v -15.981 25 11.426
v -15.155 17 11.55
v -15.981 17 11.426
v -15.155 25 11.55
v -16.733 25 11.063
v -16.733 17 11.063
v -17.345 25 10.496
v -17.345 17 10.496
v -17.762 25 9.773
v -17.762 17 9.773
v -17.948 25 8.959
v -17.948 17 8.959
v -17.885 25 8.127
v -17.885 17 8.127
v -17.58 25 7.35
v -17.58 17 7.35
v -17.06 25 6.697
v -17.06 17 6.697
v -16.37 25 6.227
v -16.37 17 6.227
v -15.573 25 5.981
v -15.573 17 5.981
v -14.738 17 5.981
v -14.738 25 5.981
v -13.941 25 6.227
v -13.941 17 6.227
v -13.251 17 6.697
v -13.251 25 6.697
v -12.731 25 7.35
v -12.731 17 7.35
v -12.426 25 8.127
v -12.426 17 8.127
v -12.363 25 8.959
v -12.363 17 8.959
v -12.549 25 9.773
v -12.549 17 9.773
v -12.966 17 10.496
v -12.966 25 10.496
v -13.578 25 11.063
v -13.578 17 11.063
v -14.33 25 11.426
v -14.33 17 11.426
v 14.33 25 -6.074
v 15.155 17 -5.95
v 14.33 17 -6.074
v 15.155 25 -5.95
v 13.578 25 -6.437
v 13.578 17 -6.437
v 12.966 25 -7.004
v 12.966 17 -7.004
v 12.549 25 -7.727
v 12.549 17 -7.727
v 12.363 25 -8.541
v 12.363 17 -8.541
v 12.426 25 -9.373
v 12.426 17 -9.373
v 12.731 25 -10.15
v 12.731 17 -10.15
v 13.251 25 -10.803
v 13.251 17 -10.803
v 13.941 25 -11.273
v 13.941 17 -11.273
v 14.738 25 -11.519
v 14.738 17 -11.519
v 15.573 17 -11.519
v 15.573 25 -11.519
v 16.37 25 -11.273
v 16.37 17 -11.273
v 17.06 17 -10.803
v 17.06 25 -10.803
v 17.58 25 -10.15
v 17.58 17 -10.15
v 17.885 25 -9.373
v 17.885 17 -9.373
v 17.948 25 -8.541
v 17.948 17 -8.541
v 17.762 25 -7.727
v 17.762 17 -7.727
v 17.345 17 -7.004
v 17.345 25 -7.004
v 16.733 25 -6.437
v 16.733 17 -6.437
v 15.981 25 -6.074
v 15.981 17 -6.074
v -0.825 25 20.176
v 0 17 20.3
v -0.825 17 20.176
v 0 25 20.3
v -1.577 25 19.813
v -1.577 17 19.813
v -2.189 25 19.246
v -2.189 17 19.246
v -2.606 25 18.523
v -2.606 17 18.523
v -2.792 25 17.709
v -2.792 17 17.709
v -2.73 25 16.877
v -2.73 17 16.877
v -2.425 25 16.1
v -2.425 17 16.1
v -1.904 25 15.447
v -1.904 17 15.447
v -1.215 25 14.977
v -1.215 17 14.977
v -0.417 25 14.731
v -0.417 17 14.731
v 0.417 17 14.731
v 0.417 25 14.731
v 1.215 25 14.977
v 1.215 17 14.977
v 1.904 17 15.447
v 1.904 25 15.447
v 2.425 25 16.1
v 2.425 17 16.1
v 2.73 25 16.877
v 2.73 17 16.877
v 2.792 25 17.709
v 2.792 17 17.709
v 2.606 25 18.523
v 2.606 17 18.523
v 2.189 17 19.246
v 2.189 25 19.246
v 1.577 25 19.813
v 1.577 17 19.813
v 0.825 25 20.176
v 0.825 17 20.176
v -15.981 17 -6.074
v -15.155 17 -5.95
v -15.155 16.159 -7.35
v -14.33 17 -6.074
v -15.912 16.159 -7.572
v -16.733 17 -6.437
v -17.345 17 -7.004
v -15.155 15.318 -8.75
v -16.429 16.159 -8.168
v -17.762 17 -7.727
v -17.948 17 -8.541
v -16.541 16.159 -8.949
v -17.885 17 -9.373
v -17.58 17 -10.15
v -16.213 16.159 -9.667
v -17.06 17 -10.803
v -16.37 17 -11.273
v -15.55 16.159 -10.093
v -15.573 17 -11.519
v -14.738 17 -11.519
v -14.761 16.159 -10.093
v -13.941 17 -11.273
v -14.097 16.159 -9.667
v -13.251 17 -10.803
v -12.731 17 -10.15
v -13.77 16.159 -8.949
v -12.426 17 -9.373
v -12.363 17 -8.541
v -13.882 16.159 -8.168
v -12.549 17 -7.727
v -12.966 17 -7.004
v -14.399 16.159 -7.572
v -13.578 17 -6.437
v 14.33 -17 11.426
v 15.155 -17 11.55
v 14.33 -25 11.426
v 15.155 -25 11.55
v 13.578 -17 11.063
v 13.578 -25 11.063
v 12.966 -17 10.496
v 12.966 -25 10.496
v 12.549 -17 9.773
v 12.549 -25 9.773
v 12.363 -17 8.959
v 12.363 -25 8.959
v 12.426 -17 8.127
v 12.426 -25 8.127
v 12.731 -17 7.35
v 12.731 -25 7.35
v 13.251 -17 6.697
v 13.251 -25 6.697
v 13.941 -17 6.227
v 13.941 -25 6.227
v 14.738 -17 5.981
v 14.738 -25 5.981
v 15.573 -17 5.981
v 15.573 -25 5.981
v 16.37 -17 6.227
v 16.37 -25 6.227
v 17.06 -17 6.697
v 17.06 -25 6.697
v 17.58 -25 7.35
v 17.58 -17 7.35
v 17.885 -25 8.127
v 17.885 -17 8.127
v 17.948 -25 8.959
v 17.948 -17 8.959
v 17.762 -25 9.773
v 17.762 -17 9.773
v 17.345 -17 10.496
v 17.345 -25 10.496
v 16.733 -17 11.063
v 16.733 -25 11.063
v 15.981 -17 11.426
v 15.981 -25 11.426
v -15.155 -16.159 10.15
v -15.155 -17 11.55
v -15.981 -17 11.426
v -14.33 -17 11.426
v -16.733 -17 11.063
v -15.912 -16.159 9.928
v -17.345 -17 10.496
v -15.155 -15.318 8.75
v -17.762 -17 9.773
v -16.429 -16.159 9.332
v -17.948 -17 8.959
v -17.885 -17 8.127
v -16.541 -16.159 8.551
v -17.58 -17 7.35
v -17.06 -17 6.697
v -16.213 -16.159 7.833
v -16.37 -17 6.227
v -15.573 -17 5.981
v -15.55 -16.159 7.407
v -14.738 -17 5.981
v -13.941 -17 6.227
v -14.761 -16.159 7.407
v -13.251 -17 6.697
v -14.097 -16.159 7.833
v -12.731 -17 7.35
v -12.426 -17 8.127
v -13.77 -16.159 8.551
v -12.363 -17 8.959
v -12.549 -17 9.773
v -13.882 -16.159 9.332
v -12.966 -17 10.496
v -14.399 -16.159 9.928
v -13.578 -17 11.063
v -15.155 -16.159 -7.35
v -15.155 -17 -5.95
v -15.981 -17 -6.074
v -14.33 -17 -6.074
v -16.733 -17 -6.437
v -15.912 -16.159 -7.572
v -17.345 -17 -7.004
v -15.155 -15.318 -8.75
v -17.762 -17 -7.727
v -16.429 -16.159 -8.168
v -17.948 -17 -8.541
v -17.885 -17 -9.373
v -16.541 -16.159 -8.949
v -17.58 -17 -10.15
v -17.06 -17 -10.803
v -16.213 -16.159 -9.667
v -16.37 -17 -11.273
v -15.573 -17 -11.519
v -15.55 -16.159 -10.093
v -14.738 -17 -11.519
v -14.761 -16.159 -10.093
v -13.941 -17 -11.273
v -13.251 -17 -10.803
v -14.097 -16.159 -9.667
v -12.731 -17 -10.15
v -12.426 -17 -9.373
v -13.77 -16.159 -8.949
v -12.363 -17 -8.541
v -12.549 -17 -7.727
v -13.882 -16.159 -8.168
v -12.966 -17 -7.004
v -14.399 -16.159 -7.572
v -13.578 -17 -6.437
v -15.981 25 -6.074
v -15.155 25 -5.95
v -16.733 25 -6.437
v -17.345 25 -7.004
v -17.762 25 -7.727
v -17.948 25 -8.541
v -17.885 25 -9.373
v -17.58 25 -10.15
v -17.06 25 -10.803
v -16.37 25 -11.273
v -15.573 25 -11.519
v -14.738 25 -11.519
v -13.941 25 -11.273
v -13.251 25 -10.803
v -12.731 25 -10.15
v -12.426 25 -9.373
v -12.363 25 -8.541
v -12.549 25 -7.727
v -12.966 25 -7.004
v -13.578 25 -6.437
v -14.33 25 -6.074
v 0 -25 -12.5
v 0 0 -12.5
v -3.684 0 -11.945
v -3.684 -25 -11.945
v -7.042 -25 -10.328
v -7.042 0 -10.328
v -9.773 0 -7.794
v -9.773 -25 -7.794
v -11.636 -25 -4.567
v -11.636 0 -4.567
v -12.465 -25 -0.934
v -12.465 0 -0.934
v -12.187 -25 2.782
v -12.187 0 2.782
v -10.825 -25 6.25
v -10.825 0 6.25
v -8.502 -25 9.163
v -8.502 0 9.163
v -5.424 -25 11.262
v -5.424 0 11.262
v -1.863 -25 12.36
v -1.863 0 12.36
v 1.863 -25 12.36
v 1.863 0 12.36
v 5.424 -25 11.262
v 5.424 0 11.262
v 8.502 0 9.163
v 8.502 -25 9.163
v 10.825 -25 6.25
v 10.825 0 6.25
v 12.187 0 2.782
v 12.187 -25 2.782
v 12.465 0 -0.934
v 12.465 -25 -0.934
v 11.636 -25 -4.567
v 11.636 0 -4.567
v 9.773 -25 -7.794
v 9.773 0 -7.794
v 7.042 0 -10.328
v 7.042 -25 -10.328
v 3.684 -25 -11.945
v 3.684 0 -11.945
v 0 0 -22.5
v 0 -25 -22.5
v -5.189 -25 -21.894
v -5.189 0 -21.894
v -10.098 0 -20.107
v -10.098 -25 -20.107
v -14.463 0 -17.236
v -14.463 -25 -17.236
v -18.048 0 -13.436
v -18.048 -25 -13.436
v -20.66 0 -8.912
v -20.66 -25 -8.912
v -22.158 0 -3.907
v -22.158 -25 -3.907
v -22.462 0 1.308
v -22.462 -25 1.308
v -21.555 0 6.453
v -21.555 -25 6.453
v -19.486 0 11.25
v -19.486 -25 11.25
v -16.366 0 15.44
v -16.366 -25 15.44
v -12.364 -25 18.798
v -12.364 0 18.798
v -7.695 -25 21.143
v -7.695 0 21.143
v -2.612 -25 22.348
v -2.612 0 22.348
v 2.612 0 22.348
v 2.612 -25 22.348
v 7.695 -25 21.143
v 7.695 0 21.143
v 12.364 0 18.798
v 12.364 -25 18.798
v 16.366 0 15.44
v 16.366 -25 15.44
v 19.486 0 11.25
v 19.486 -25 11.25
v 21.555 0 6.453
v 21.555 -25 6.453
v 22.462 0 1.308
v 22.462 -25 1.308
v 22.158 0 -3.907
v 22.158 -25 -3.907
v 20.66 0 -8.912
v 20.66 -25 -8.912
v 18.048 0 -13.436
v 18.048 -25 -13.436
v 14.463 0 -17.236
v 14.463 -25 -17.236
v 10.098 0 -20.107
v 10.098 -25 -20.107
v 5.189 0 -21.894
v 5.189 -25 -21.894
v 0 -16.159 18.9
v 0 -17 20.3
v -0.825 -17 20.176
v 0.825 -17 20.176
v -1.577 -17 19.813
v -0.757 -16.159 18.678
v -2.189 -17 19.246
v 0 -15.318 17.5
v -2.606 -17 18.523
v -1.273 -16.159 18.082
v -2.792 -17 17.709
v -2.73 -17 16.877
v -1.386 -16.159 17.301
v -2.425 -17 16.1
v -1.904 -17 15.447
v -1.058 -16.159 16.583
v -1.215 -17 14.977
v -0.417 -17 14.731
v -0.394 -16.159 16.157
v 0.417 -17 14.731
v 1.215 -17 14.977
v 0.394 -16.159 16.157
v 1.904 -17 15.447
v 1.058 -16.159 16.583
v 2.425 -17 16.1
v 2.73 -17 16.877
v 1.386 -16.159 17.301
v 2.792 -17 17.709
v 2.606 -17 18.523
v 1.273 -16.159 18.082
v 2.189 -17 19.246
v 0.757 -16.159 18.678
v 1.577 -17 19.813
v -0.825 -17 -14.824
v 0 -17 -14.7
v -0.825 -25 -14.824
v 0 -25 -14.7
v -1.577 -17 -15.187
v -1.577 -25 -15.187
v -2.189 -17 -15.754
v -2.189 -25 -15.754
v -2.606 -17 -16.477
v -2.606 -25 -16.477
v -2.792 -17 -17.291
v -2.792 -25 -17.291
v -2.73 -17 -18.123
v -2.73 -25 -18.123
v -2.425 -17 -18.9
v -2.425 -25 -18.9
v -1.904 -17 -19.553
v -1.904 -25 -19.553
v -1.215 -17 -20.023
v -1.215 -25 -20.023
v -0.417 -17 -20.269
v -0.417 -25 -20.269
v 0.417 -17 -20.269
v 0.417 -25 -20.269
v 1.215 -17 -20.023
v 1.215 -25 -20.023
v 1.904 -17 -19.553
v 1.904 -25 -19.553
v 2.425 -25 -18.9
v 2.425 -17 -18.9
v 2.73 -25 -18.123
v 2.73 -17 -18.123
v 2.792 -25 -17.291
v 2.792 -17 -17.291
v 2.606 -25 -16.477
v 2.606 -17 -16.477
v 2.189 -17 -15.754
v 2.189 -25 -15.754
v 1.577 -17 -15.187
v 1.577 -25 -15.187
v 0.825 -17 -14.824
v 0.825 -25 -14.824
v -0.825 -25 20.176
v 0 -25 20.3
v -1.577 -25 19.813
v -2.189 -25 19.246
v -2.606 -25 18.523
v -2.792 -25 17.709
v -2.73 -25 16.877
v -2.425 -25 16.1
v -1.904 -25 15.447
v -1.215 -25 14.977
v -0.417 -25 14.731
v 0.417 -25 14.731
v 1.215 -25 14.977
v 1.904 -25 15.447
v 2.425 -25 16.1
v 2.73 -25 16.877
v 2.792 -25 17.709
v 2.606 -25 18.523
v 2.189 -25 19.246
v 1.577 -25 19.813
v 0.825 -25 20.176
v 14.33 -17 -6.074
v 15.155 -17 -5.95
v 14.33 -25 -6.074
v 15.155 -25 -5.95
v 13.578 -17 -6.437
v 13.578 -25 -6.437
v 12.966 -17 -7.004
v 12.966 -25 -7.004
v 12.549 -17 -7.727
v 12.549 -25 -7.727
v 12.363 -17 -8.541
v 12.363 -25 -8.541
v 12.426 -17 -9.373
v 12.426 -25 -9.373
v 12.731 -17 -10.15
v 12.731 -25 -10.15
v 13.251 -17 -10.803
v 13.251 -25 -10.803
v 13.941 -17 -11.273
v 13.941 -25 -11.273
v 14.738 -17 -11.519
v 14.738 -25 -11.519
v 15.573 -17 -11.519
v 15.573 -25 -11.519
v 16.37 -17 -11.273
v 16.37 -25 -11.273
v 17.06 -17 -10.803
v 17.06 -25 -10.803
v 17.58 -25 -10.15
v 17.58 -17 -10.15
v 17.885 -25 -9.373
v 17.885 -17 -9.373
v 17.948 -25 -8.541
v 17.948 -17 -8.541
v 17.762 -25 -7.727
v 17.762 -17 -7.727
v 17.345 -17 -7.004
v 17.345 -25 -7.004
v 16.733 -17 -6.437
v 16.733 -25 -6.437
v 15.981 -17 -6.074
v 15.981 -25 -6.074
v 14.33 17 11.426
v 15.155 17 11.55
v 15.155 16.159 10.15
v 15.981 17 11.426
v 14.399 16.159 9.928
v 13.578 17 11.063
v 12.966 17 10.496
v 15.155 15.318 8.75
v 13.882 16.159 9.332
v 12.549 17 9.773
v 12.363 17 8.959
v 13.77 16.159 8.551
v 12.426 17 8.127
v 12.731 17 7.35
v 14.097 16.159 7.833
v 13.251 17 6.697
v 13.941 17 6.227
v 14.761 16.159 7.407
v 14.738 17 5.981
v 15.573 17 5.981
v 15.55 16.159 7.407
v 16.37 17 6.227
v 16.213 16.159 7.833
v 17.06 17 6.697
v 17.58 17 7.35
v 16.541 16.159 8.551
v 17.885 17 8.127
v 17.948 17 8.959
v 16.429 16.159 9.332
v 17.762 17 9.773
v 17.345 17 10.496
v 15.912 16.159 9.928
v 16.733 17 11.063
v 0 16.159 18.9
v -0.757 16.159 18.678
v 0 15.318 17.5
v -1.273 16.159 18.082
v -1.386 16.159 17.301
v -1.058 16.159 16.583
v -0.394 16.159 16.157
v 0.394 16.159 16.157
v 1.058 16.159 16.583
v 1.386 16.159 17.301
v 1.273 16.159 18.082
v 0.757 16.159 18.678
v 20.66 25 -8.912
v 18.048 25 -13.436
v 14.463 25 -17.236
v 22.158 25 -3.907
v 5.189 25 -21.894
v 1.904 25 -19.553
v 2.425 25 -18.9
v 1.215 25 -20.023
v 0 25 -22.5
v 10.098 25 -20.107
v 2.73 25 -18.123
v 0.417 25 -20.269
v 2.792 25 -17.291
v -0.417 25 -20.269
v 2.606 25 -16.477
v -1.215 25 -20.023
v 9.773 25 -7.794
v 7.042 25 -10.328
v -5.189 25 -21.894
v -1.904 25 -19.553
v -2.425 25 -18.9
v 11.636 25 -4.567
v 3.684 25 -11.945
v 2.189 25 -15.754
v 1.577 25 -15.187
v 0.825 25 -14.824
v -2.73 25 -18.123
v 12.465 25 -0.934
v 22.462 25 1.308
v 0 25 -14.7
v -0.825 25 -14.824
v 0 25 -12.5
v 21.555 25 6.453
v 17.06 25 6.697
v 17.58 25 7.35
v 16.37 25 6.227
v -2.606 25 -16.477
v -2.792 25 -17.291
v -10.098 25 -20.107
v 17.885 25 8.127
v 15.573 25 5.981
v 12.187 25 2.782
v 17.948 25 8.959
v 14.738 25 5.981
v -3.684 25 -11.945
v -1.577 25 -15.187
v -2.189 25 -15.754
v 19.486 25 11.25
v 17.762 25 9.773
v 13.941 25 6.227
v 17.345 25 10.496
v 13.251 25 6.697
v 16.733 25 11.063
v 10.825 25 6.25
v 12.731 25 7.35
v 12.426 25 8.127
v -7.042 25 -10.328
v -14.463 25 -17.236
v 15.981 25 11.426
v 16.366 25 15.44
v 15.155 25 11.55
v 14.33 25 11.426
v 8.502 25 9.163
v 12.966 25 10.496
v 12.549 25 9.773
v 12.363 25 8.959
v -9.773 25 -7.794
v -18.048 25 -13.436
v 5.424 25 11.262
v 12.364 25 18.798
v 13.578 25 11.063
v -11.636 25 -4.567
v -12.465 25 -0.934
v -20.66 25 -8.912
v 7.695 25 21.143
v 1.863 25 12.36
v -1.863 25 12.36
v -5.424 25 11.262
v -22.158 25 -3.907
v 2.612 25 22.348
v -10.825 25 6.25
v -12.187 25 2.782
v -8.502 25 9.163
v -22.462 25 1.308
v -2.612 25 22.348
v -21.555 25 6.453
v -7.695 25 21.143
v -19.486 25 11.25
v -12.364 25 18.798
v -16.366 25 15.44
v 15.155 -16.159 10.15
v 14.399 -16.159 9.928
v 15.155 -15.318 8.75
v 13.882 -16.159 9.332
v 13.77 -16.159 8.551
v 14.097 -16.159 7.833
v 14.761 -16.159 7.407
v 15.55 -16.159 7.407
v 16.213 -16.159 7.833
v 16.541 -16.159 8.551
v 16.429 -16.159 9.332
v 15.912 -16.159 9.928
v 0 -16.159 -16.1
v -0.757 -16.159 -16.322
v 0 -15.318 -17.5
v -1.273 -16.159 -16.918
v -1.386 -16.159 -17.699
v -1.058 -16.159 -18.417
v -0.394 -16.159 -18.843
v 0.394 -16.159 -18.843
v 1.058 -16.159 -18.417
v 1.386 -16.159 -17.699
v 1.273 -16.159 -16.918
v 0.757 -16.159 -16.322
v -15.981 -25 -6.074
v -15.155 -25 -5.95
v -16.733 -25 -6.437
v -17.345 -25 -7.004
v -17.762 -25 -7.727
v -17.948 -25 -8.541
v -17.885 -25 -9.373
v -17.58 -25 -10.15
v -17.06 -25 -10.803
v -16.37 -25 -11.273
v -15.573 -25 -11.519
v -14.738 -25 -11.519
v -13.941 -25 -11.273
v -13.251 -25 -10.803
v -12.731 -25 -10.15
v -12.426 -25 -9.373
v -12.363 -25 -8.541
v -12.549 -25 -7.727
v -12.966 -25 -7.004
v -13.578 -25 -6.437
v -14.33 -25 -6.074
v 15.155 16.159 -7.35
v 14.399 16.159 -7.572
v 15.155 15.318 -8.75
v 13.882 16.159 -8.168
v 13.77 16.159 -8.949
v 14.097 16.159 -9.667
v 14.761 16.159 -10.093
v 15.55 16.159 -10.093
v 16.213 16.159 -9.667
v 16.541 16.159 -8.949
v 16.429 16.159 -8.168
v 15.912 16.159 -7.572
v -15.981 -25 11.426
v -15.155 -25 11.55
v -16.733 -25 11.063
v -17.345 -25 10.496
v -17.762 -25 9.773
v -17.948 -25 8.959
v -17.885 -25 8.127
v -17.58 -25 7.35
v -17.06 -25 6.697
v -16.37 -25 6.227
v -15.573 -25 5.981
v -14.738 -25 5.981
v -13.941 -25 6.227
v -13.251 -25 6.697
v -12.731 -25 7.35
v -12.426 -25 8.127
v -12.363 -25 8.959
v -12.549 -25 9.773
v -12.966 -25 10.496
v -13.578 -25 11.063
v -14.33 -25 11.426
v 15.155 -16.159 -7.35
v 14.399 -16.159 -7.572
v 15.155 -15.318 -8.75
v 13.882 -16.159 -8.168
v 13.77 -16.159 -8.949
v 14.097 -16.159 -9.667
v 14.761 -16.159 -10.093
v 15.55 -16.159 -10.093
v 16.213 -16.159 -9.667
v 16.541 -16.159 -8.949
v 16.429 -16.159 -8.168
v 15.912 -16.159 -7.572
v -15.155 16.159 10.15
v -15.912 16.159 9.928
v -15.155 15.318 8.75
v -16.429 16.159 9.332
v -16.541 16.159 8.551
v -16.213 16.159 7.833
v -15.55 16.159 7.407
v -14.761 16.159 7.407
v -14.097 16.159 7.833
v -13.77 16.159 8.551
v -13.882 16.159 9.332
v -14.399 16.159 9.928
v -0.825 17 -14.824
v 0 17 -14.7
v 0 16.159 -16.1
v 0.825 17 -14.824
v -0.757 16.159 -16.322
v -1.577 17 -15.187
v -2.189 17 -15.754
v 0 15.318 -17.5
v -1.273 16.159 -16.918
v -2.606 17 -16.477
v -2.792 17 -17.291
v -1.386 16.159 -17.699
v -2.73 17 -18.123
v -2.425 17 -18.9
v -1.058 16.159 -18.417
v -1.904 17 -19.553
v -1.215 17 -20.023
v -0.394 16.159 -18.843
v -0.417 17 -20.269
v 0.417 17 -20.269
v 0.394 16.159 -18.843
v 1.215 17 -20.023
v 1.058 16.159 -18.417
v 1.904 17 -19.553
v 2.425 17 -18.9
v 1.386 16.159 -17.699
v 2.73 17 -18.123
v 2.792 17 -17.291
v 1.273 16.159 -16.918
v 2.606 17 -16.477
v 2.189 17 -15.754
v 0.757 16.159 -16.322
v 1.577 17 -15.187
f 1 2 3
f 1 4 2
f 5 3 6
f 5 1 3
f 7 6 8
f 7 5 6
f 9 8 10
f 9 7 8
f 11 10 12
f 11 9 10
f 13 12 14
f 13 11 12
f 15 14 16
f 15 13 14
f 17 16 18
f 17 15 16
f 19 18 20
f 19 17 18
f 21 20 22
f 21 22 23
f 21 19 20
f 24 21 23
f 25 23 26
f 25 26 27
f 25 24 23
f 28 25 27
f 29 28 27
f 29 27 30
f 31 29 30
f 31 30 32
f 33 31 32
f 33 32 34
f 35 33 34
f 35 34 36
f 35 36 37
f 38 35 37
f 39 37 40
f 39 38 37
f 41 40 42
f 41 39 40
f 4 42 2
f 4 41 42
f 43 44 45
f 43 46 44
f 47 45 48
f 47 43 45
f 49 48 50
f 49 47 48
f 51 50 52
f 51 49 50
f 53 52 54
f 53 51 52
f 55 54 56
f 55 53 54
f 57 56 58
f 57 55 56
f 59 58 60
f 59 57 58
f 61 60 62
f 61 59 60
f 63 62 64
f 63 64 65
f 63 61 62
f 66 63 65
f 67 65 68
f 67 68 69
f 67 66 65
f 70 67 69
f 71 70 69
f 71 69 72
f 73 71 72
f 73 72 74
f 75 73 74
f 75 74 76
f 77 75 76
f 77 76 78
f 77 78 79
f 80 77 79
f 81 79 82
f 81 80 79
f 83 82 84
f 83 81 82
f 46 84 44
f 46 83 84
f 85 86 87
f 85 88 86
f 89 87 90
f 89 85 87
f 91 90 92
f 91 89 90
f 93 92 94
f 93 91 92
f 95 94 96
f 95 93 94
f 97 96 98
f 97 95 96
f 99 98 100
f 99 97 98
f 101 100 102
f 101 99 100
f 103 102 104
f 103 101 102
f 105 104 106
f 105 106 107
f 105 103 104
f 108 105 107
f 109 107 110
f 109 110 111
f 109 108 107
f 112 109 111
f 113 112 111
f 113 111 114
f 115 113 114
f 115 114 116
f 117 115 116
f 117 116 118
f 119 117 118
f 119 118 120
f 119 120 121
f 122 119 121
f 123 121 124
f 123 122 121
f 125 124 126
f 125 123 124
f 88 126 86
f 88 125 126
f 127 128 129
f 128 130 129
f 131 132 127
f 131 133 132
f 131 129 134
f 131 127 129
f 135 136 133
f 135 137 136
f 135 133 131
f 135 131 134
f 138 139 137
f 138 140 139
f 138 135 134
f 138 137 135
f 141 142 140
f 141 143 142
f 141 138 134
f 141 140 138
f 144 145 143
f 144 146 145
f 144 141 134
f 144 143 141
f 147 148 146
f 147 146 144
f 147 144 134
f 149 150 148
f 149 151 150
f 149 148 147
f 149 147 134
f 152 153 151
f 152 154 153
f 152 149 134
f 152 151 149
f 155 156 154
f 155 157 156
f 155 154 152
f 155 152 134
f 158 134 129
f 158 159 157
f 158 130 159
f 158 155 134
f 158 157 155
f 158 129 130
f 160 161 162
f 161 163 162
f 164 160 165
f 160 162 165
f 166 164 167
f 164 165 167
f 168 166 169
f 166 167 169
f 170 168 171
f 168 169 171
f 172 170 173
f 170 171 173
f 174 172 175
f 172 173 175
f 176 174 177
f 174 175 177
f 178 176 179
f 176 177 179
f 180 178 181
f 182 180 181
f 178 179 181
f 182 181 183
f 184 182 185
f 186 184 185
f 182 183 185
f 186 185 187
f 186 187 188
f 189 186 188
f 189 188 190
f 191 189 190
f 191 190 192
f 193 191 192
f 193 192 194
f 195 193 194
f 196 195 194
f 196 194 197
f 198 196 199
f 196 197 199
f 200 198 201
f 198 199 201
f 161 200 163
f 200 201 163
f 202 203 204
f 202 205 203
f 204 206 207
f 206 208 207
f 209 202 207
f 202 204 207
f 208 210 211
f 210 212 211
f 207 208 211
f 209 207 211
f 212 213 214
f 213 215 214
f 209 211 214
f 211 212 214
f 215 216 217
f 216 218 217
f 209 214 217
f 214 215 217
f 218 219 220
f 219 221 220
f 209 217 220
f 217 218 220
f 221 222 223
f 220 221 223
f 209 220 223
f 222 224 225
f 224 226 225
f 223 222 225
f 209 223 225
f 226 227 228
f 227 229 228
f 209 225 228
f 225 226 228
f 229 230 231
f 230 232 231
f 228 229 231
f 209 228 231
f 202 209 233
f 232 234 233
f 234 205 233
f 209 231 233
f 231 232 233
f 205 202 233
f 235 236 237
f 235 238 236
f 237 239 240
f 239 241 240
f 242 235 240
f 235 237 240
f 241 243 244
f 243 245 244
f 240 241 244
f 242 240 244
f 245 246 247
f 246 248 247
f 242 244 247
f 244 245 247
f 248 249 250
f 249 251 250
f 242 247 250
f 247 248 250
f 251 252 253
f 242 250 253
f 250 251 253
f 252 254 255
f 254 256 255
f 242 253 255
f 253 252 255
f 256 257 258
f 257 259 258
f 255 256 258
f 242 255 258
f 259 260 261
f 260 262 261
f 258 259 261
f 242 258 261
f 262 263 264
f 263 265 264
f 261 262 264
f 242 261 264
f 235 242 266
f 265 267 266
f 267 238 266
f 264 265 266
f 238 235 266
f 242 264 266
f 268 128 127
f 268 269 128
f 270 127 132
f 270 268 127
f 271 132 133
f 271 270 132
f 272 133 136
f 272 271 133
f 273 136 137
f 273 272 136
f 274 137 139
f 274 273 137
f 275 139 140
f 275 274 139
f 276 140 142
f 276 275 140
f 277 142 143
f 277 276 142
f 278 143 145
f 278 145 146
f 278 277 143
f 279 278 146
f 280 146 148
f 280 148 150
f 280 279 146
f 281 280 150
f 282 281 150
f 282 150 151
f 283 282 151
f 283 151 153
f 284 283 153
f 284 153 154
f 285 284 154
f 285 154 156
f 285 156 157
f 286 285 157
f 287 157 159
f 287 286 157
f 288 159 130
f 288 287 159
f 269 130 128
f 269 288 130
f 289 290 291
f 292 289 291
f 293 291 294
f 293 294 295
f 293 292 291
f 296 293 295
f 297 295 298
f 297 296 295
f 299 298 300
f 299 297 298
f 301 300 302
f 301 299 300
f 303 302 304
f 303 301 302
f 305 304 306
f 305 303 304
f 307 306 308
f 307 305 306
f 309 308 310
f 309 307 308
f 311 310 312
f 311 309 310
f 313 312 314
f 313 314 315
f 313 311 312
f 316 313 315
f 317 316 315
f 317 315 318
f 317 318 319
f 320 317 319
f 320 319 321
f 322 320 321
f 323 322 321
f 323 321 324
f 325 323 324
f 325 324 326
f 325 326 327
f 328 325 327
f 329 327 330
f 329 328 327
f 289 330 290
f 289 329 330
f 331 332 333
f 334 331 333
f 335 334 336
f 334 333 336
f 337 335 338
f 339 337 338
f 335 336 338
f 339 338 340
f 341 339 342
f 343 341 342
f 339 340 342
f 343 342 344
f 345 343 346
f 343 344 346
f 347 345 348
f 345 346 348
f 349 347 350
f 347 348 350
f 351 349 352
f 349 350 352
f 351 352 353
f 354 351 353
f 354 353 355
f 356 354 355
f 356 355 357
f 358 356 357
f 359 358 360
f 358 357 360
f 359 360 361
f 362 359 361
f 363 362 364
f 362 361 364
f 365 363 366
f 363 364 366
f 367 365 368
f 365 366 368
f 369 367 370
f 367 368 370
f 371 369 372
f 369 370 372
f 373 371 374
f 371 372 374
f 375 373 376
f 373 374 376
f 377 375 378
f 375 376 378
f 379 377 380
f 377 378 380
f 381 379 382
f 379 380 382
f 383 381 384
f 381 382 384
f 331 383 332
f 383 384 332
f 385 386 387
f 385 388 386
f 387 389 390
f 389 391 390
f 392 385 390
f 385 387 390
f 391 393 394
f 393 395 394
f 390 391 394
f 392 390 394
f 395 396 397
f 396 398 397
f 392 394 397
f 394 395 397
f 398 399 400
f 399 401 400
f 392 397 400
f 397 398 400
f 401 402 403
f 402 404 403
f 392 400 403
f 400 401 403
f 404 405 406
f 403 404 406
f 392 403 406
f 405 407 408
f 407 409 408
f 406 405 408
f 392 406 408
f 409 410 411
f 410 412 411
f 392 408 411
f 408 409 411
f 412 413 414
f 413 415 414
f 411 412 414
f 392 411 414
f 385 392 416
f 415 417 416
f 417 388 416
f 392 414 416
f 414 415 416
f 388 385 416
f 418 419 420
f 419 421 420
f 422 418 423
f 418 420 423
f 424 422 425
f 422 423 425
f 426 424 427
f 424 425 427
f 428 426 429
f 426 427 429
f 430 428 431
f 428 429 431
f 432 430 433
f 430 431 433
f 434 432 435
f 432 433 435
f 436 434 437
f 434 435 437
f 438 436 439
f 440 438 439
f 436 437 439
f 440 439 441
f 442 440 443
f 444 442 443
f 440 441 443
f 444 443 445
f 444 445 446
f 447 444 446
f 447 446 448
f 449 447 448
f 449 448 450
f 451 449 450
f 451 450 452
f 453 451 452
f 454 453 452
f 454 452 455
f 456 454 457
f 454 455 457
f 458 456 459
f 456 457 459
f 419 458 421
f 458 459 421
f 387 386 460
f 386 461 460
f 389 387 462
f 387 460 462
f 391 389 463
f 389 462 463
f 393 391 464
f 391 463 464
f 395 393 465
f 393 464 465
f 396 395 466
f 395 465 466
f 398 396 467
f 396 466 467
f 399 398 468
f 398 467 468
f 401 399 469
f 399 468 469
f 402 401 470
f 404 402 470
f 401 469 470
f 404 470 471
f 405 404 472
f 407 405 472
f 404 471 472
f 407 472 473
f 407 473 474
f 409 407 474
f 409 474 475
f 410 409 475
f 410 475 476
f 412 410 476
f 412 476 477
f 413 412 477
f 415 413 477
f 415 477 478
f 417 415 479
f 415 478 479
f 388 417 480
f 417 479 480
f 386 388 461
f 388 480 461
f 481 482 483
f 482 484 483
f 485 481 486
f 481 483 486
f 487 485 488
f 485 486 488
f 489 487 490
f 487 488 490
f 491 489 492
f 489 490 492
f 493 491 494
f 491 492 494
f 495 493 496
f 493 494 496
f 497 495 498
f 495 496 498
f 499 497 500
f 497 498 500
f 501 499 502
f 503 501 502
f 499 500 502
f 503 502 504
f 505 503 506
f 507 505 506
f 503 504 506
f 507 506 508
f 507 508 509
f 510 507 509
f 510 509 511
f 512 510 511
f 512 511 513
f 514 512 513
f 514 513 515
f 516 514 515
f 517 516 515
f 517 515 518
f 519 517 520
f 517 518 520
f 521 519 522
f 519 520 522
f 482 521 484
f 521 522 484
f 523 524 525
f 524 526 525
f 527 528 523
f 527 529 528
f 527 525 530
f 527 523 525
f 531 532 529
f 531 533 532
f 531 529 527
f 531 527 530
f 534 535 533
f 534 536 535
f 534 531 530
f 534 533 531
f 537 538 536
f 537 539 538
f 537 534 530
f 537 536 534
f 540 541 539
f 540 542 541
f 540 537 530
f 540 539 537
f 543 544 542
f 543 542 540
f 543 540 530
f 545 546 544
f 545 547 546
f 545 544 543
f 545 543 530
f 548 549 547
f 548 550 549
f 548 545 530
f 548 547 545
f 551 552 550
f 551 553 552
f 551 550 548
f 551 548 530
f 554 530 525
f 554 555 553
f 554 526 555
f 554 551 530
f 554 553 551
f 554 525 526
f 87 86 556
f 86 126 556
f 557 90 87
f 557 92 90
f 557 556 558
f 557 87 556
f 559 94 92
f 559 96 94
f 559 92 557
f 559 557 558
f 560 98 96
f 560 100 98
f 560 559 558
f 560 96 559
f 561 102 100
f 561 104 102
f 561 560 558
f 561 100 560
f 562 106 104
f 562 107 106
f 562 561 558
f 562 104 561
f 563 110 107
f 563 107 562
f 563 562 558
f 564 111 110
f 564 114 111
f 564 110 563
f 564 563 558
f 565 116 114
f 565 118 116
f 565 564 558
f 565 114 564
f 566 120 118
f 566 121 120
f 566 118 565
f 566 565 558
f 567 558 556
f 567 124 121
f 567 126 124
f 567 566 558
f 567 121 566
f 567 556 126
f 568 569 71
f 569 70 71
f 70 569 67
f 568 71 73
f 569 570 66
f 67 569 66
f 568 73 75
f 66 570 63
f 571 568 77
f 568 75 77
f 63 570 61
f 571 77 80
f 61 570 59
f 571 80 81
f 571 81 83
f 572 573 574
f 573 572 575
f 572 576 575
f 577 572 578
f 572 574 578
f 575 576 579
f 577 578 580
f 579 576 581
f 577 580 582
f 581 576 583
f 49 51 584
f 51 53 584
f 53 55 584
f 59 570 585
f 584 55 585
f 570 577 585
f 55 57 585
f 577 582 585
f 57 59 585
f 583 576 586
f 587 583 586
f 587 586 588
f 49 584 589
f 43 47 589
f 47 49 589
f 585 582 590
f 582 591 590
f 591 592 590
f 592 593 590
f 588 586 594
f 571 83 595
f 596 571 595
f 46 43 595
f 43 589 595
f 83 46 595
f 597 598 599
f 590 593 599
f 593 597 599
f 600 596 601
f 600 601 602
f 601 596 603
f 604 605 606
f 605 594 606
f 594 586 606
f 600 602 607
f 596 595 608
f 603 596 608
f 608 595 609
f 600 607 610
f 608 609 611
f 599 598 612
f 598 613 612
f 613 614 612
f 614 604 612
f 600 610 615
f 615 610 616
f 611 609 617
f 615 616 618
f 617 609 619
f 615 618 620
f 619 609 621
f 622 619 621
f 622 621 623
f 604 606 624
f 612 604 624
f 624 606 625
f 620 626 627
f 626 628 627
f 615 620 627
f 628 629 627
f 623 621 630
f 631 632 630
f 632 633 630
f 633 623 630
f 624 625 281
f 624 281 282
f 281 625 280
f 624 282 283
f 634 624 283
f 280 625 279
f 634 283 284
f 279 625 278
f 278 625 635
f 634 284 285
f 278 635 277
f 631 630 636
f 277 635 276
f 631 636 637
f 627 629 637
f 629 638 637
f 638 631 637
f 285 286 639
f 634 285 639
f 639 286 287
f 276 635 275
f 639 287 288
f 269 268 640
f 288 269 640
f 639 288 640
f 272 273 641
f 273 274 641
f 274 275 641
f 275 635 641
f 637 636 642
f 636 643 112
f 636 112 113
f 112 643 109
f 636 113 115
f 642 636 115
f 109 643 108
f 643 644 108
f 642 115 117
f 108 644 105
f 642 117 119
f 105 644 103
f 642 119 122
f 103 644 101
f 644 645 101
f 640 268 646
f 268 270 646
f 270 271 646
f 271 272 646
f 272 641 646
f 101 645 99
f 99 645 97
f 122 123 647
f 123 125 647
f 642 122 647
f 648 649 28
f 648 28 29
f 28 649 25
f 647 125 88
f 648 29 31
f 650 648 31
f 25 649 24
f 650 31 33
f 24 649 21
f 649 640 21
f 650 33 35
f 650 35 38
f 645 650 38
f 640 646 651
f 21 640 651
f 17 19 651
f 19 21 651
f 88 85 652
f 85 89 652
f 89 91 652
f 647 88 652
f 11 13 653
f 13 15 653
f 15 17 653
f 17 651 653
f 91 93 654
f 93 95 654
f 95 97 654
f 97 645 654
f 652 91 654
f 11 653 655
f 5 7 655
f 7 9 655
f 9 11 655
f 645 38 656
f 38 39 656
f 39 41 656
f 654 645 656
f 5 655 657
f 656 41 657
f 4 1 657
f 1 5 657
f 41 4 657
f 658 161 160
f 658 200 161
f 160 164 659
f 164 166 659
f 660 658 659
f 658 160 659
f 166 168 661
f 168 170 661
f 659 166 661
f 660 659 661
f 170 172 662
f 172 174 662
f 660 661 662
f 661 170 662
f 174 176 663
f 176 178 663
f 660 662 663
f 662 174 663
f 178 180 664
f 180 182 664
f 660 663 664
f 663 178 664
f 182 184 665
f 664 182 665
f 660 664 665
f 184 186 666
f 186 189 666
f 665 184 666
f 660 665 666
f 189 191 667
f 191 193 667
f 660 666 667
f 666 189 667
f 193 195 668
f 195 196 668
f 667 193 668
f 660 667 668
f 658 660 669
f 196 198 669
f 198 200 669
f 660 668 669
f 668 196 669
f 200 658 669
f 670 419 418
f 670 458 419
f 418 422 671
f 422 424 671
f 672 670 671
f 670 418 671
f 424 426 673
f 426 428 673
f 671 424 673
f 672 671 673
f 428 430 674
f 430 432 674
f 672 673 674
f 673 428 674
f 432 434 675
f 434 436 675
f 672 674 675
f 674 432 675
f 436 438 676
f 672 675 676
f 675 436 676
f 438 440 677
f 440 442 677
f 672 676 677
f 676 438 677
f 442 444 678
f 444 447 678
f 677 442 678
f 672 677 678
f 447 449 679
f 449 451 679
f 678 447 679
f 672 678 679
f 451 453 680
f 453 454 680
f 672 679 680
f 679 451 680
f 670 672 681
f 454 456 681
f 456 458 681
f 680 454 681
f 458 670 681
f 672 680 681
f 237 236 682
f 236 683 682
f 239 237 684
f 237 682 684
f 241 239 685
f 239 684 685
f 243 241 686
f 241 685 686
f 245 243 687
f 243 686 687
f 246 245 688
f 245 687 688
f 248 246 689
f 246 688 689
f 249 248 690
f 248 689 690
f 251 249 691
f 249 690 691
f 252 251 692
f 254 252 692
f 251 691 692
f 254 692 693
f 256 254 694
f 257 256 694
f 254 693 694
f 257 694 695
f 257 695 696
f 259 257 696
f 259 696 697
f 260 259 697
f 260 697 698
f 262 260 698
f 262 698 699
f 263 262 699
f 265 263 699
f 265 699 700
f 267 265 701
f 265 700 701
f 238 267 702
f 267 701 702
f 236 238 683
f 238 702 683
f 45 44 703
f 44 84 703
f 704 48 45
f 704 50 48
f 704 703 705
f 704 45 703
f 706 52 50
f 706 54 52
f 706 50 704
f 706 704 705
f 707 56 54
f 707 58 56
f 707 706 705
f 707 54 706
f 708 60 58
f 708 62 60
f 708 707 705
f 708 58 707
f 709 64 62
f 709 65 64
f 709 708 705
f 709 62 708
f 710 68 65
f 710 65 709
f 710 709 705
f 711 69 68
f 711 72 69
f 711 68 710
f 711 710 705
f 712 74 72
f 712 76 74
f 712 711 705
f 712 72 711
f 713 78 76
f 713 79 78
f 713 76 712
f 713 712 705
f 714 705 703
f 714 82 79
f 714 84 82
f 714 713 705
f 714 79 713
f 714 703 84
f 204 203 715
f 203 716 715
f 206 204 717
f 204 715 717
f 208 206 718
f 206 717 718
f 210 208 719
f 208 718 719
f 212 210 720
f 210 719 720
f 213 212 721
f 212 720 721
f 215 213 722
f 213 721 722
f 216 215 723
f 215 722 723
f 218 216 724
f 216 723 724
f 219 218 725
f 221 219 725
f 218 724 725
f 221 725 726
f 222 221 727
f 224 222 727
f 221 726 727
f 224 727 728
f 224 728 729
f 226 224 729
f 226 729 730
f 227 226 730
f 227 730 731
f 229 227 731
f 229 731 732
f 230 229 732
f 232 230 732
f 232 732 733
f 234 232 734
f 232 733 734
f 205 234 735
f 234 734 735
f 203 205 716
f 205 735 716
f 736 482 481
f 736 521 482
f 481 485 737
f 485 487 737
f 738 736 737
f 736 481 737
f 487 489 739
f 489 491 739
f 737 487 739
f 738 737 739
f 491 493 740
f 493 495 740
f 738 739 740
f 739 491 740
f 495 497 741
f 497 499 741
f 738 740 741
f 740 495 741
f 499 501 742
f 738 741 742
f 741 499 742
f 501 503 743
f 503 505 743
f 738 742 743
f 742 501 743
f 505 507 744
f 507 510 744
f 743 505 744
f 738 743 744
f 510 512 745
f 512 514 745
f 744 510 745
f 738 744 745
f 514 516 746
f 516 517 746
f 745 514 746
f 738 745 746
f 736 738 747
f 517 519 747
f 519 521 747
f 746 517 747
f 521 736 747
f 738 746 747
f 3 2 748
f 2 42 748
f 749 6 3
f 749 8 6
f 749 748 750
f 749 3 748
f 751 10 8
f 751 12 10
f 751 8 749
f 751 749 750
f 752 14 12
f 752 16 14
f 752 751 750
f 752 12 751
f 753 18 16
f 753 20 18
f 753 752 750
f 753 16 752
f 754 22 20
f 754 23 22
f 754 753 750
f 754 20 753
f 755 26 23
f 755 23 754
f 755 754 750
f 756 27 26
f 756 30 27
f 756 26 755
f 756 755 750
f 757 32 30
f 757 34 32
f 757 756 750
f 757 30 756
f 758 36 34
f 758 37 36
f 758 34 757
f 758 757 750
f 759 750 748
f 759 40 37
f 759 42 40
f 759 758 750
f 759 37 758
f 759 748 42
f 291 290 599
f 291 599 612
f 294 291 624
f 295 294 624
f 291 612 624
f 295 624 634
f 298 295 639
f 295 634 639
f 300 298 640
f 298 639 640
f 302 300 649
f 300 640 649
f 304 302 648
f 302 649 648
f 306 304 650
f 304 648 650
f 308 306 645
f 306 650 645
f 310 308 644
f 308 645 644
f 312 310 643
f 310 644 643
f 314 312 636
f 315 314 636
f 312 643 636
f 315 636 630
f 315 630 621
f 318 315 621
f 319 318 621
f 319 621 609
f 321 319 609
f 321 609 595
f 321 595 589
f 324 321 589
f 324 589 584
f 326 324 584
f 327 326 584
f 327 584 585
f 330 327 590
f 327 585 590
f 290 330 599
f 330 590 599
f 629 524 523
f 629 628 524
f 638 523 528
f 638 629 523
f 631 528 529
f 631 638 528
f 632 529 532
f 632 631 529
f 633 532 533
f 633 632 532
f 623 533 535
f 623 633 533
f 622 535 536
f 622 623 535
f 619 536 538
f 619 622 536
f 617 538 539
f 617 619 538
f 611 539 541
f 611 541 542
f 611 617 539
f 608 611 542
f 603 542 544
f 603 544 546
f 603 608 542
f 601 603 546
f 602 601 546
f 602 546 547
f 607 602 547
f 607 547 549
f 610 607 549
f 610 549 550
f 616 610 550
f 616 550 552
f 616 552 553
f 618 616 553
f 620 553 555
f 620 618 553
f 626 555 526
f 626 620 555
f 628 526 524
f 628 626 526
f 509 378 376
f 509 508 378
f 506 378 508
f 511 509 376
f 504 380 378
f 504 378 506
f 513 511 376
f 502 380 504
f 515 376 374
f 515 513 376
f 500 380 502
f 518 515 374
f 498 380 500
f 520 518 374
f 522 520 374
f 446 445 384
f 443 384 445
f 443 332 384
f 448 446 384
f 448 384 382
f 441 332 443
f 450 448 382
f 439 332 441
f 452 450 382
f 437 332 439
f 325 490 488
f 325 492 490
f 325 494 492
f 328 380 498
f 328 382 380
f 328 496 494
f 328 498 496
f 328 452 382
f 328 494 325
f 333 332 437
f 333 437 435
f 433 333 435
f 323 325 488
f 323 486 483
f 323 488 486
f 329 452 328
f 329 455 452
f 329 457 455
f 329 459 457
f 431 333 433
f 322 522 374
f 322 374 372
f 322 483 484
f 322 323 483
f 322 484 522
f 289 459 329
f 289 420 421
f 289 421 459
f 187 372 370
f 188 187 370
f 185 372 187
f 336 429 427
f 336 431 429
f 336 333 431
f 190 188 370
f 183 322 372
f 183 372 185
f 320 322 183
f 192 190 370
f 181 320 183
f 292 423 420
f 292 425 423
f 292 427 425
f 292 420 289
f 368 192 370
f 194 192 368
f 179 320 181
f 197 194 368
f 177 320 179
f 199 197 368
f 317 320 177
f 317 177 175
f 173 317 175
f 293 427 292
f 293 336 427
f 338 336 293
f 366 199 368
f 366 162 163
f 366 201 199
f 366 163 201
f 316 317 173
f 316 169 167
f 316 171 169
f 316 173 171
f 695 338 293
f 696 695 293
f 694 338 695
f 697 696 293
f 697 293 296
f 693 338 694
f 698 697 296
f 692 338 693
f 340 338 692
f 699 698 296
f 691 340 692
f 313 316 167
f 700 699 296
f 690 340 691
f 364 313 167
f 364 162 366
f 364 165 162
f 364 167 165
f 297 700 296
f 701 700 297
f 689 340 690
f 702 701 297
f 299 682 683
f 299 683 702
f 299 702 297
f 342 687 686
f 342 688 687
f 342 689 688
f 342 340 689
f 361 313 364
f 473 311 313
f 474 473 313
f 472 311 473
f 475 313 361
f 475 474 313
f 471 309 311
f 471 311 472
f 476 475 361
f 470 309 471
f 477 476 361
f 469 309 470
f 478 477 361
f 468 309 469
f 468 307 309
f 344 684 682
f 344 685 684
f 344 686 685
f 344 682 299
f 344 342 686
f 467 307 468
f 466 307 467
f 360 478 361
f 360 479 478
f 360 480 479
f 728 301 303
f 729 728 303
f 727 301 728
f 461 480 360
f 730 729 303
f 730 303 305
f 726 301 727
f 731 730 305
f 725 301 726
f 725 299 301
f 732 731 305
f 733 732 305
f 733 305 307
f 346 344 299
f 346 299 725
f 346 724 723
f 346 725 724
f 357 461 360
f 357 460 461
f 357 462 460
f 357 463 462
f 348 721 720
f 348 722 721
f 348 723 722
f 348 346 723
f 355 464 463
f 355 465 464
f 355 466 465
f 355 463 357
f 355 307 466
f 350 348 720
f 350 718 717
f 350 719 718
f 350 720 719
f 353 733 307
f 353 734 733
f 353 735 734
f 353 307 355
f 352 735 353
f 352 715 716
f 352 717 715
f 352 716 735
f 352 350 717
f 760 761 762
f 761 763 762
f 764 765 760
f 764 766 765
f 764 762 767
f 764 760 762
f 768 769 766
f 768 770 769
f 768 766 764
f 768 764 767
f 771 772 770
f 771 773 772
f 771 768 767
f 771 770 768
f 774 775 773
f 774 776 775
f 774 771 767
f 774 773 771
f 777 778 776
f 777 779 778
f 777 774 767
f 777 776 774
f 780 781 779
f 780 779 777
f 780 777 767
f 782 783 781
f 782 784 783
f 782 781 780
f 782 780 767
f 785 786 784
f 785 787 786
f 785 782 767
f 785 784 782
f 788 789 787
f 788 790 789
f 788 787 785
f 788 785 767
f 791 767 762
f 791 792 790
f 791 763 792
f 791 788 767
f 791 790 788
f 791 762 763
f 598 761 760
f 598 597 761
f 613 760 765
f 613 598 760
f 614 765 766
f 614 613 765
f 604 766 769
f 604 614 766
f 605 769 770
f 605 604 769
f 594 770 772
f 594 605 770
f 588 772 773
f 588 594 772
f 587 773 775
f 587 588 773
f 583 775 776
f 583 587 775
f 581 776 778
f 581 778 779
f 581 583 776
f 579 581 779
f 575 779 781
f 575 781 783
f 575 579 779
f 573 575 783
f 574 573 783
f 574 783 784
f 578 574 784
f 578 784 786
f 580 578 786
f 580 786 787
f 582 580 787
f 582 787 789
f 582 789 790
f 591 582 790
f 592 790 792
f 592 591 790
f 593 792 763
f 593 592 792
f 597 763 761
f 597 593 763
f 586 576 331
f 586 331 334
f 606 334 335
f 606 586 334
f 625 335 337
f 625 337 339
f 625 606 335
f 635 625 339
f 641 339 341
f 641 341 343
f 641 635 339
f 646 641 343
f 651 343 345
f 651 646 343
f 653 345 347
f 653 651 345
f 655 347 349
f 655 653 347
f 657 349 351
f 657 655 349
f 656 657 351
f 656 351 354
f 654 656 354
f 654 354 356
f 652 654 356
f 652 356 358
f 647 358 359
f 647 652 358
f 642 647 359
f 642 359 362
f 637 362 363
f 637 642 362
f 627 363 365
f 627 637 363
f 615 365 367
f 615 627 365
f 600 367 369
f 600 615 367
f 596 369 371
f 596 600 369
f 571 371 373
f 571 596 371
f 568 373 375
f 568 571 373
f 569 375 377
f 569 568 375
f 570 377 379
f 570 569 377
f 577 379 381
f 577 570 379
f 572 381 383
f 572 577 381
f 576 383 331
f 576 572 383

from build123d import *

# Parameters (mm, degrees)
SKETCH2_W                           = 10
SKETCH2_H                           = 25
F_5_6_5_6_DIAMETER_HOLE1_AT_2_COUNT = 2
F_5_6_5_6_DIAMETER_HOLE1_AT_2_PITCH = 17.5
F_5_6_5_6_DIAMETER_HOLE1_AT_3_COUNT = 2
F_5_6_5_6_DIAMETER_HOLE1_AT_3_PITCH = 30.310889132
F_5_6_5_6_DIAMETER_HOLE1_AT_4_COUNT = 2
F_5_6_5_6_DIAMETER_HOLE1_AT_4_PITCH = 35
F_5_6_5_6_DIAMETER_HOLE1_AT_5_COUNT = 2
F_5_6_5_6_DIAMETER_HOLE1_AT_5_PITCH = 30.310889132
F_5_6_5_6_DIAMETER_HOLE1_AT_6_COUNT = 2
F_5_6_5_6_DIAMETER_HOLE1_AT_6_PITCH = 17.5


with BuildPart() as part:
    # Sketch2 → Revolve1 (revolve)
    with BuildSketch(Plane.XY, mode=Mode.PRIVATE) as revolve1_sk:
        with Locations((17.5, 12.5)):
            Rectangle(SKETCH2_W, SKETCH2_H)
    revolve1 = revolve(revolve1_sk.sketch.rotate(Axis((0, 0, 0), (0, 1, 0)), 90), axis=Axis((0, 0, 0), (0, 1, 0)))

    # Sketch5 → Ø5.6 (5.6) Diameter Hole1 (revolve, cut)
    with BuildSketch(Plane(origin=(15.155444566, 25, 8.75), x_dir=(0, 0, 1), z_dir=(1, 0, 0))):
        Polygon((0, 0), (0, 9.682409733), (2.8, 8), (2.8, 0), align=None)
    f_5_6_5_6_diameter_hole1 = revolve(axis=Axis((15.155444566, 31.35, 8.75), (0, -1, 0)), mode=Mode.SUBTRACT)

    # Ø5.6 (5.6) Diameter Hole1 at 2: Ø5.6 (5.6) Diameter Hole1 ×2
    with Locations(*[Vector(-0.8660254037844417, 0, 0.49999999999999495) * (i * F_5_6_5_6_DIAMETER_HOLE1_AT_2_PITCH) for i in range(1, F_5_6_5_6_DIAMETER_HOLE1_AT_2_COUNT)]):
        add(f_5_6_5_6_diameter_hole1, mode=Mode.SUBTRACT)

    # Ø5.6 (5.6) Diameter Hole1 at 3: Ø5.6 (5.6) Diameter Hole1 ×2
    with Locations(*[(-i * F_5_6_5_6_DIAMETER_HOLE1_AT_3_PITCH, 0, 0) for i in range(1, F_5_6_5_6_DIAMETER_HOLE1_AT_3_COUNT)]):
        add(f_5_6_5_6_diameter_hole1, mode=Mode.SUBTRACT)

    # Ø5.6 (5.6) Diameter Hole1 at 4: Ø5.6 (5.6) Diameter Hole1 ×2
    with Locations(*[Vector(-0.8660254037844346, 0, -0.5000000000000072) * (i * F_5_6_5_6_DIAMETER_HOLE1_AT_4_PITCH) for i in range(1, F_5_6_5_6_DIAMETER_HOLE1_AT_4_COUNT)]):
        add(f_5_6_5_6_diameter_hole1, mode=Mode.SUBTRACT)

    # Ø5.6 (5.6) Diameter Hole1 at 5: Ø5.6 (5.6) Diameter Hole1 ×2
    with Locations(*[Vector(-0.49999999999999195, 0, -0.8660254037844433) * (i * F_5_6_5_6_DIAMETER_HOLE1_AT_5_PITCH) for i in range(1, F_5_6_5_6_DIAMETER_HOLE1_AT_5_COUNT)]):
        add(f_5_6_5_6_diameter_hole1, mode=Mode.SUBTRACT)

    # Ø5.6 (5.6) Diameter Hole1 at 6: Ø5.6 (5.6) Diameter Hole1 ×2
    with Locations(*[(0, 0, -i * F_5_6_5_6_DIAMETER_HOLE1_AT_6_PITCH) for i in range(1, F_5_6_5_6_DIAMETER_HOLE1_AT_6_COUNT)]):
        add(f_5_6_5_6_diameter_hole1, mode=Mode.SUBTRACT)

    # Mirror1: Revolve1, Ø5.6 (5.6) Diameter Hole1 across plane
    add(revolve1.mirror(Plane.ZX))
    add(f_5_6_5_6_diameter_hole1.mirror(Plane.ZX), mode=Mode.SUBTRACT)

    # Mirror1 copy 1 sketch → Mirror1 copy 1 (revolve, cut)
    with BuildSketch(Plane(origin=(0, -25, 17.5), x_dir=(0, 0, 1), z_dir=(1, 0, 0))):
        Polygon((0, 0), (0, -9.682409733), (2.8, -8), (2.8, 0), align=None)
    revolve(axis=Axis((0, -31.35, 17.5), (0, -1, 0)), mode=Mode.SUBTRACT)

    # Mirror1 copy 2 sketch → Mirror1 copy 2 (revolve, cut)
    with BuildSketch(Plane(origin=(-15.155444566, -25, 8.75), x_dir=(0, 0, 1), z_dir=(1, 0, 0))):
        Polygon((0, 0), (0, -9.682409733), (2.8, -8), (2.8, 0), align=None)
    revolve(axis=Axis((-15.155444566, -31.35, 8.75), (0, -1, 0)), mode=Mode.SUBTRACT)

    # Mirror1 copy 3 sketch → Mirror1 copy 3 (revolve, cut)
    with BuildSketch(Plane(origin=(-15.155444566, -25, -8.75), x_dir=(0, 0, 1), z_dir=(1, 0, 0))):
        Polygon((0, 0), (0, -9.682409733), (2.8, -8), (2.8, 0), align=None)
    revolve(axis=Axis((-15.155444566, -31.35, -8.75), (0, -1, 0)), mode=Mode.SUBTRACT)

    # Mirror1 copy 4 sketch → Mirror1 copy 4 (revolve, cut)
    with BuildSketch(Plane(origin=(0, -25, -17.5), x_dir=(0, 0, 1), z_dir=(1, 0, 0))):
        Polygon((0, 0), (0, -9.682409733), (2.8, -8), (2.8, 0), align=None)
    revolve(axis=Axis((0, -31.35, -17.5), (0, -1, 0)), mode=Mode.SUBTRACT)

    # Mirror1 copy 5 sketch → Mirror1 copy 5 (revolve, cut)
    with BuildSketch(Plane(origin=(15.155444566, -25, -8.75), x_dir=(0, 0, 1), z_dir=(1, 0, 0))):
        Polygon((0, 0), (0, -9.682409733), (2.8, -8), (2.8, 0), align=None)
    revolve(axis=Axis((15.155444566, -31.35, -8.75), (0, -1, 0)), mode=Mode.SUBTRACT)


solid = part.part
